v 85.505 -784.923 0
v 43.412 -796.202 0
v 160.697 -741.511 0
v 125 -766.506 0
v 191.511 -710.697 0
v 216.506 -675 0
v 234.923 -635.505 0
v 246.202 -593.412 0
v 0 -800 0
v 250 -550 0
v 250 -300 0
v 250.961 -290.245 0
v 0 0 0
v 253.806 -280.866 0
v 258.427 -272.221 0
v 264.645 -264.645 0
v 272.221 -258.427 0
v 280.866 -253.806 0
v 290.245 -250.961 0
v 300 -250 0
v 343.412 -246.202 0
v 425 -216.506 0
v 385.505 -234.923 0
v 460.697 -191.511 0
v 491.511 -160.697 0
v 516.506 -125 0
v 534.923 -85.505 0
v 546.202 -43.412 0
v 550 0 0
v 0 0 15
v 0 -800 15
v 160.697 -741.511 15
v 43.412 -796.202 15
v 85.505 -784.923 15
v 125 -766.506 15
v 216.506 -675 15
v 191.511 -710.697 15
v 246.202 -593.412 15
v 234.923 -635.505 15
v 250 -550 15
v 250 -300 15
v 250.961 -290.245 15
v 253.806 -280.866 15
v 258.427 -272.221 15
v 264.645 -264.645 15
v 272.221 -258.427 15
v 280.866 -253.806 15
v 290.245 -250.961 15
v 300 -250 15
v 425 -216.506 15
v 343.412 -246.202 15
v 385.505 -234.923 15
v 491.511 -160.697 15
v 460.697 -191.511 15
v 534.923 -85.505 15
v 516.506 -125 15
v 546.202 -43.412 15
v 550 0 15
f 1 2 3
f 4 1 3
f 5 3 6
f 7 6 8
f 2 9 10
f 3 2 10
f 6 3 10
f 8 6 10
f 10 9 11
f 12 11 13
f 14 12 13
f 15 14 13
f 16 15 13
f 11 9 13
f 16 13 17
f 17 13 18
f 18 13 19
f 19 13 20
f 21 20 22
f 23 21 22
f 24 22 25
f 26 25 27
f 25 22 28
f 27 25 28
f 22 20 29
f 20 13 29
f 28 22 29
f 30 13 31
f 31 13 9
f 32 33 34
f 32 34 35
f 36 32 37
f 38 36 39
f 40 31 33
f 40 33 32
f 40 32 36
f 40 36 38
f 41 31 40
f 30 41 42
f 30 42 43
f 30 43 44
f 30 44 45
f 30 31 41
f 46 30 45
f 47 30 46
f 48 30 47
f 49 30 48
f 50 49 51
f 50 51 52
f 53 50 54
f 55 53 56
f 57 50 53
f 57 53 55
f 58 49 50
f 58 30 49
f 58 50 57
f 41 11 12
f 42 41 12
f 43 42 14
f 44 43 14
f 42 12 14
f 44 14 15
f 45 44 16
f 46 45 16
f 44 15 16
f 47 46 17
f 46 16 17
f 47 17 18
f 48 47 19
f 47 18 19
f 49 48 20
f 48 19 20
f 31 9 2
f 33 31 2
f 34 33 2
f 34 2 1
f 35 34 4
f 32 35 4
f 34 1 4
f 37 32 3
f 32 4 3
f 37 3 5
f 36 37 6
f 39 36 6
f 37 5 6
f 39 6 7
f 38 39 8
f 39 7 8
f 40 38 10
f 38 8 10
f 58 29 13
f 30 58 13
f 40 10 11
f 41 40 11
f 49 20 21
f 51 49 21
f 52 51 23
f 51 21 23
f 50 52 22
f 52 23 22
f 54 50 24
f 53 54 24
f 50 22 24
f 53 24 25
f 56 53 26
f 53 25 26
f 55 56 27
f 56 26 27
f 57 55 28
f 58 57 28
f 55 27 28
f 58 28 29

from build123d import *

# Parameters (mm, degrees)
F1_DEPTH = 15


with BuildPart() as f1:
    # F0 (on Top) → F1 (new body)
    with BuildSketch(Plane.XY):
        with BuildLine():
            Line((550, 0), (0, 0))
            Line((0, 0), (0, -800))
            ThreePointArc((0, -800), (176.776695, -726.776695), (250, -550))
            Line((250, -550), (250, -300))
            ThreePointArc((250, -300), (264.644661, -264.644661), (300, -250))
            ThreePointArc((300, -250), (476.776695, -176.776695), (550, 0))
        make_face()
    extrude(amount=F1_DEPTH)


solid = f1.part
